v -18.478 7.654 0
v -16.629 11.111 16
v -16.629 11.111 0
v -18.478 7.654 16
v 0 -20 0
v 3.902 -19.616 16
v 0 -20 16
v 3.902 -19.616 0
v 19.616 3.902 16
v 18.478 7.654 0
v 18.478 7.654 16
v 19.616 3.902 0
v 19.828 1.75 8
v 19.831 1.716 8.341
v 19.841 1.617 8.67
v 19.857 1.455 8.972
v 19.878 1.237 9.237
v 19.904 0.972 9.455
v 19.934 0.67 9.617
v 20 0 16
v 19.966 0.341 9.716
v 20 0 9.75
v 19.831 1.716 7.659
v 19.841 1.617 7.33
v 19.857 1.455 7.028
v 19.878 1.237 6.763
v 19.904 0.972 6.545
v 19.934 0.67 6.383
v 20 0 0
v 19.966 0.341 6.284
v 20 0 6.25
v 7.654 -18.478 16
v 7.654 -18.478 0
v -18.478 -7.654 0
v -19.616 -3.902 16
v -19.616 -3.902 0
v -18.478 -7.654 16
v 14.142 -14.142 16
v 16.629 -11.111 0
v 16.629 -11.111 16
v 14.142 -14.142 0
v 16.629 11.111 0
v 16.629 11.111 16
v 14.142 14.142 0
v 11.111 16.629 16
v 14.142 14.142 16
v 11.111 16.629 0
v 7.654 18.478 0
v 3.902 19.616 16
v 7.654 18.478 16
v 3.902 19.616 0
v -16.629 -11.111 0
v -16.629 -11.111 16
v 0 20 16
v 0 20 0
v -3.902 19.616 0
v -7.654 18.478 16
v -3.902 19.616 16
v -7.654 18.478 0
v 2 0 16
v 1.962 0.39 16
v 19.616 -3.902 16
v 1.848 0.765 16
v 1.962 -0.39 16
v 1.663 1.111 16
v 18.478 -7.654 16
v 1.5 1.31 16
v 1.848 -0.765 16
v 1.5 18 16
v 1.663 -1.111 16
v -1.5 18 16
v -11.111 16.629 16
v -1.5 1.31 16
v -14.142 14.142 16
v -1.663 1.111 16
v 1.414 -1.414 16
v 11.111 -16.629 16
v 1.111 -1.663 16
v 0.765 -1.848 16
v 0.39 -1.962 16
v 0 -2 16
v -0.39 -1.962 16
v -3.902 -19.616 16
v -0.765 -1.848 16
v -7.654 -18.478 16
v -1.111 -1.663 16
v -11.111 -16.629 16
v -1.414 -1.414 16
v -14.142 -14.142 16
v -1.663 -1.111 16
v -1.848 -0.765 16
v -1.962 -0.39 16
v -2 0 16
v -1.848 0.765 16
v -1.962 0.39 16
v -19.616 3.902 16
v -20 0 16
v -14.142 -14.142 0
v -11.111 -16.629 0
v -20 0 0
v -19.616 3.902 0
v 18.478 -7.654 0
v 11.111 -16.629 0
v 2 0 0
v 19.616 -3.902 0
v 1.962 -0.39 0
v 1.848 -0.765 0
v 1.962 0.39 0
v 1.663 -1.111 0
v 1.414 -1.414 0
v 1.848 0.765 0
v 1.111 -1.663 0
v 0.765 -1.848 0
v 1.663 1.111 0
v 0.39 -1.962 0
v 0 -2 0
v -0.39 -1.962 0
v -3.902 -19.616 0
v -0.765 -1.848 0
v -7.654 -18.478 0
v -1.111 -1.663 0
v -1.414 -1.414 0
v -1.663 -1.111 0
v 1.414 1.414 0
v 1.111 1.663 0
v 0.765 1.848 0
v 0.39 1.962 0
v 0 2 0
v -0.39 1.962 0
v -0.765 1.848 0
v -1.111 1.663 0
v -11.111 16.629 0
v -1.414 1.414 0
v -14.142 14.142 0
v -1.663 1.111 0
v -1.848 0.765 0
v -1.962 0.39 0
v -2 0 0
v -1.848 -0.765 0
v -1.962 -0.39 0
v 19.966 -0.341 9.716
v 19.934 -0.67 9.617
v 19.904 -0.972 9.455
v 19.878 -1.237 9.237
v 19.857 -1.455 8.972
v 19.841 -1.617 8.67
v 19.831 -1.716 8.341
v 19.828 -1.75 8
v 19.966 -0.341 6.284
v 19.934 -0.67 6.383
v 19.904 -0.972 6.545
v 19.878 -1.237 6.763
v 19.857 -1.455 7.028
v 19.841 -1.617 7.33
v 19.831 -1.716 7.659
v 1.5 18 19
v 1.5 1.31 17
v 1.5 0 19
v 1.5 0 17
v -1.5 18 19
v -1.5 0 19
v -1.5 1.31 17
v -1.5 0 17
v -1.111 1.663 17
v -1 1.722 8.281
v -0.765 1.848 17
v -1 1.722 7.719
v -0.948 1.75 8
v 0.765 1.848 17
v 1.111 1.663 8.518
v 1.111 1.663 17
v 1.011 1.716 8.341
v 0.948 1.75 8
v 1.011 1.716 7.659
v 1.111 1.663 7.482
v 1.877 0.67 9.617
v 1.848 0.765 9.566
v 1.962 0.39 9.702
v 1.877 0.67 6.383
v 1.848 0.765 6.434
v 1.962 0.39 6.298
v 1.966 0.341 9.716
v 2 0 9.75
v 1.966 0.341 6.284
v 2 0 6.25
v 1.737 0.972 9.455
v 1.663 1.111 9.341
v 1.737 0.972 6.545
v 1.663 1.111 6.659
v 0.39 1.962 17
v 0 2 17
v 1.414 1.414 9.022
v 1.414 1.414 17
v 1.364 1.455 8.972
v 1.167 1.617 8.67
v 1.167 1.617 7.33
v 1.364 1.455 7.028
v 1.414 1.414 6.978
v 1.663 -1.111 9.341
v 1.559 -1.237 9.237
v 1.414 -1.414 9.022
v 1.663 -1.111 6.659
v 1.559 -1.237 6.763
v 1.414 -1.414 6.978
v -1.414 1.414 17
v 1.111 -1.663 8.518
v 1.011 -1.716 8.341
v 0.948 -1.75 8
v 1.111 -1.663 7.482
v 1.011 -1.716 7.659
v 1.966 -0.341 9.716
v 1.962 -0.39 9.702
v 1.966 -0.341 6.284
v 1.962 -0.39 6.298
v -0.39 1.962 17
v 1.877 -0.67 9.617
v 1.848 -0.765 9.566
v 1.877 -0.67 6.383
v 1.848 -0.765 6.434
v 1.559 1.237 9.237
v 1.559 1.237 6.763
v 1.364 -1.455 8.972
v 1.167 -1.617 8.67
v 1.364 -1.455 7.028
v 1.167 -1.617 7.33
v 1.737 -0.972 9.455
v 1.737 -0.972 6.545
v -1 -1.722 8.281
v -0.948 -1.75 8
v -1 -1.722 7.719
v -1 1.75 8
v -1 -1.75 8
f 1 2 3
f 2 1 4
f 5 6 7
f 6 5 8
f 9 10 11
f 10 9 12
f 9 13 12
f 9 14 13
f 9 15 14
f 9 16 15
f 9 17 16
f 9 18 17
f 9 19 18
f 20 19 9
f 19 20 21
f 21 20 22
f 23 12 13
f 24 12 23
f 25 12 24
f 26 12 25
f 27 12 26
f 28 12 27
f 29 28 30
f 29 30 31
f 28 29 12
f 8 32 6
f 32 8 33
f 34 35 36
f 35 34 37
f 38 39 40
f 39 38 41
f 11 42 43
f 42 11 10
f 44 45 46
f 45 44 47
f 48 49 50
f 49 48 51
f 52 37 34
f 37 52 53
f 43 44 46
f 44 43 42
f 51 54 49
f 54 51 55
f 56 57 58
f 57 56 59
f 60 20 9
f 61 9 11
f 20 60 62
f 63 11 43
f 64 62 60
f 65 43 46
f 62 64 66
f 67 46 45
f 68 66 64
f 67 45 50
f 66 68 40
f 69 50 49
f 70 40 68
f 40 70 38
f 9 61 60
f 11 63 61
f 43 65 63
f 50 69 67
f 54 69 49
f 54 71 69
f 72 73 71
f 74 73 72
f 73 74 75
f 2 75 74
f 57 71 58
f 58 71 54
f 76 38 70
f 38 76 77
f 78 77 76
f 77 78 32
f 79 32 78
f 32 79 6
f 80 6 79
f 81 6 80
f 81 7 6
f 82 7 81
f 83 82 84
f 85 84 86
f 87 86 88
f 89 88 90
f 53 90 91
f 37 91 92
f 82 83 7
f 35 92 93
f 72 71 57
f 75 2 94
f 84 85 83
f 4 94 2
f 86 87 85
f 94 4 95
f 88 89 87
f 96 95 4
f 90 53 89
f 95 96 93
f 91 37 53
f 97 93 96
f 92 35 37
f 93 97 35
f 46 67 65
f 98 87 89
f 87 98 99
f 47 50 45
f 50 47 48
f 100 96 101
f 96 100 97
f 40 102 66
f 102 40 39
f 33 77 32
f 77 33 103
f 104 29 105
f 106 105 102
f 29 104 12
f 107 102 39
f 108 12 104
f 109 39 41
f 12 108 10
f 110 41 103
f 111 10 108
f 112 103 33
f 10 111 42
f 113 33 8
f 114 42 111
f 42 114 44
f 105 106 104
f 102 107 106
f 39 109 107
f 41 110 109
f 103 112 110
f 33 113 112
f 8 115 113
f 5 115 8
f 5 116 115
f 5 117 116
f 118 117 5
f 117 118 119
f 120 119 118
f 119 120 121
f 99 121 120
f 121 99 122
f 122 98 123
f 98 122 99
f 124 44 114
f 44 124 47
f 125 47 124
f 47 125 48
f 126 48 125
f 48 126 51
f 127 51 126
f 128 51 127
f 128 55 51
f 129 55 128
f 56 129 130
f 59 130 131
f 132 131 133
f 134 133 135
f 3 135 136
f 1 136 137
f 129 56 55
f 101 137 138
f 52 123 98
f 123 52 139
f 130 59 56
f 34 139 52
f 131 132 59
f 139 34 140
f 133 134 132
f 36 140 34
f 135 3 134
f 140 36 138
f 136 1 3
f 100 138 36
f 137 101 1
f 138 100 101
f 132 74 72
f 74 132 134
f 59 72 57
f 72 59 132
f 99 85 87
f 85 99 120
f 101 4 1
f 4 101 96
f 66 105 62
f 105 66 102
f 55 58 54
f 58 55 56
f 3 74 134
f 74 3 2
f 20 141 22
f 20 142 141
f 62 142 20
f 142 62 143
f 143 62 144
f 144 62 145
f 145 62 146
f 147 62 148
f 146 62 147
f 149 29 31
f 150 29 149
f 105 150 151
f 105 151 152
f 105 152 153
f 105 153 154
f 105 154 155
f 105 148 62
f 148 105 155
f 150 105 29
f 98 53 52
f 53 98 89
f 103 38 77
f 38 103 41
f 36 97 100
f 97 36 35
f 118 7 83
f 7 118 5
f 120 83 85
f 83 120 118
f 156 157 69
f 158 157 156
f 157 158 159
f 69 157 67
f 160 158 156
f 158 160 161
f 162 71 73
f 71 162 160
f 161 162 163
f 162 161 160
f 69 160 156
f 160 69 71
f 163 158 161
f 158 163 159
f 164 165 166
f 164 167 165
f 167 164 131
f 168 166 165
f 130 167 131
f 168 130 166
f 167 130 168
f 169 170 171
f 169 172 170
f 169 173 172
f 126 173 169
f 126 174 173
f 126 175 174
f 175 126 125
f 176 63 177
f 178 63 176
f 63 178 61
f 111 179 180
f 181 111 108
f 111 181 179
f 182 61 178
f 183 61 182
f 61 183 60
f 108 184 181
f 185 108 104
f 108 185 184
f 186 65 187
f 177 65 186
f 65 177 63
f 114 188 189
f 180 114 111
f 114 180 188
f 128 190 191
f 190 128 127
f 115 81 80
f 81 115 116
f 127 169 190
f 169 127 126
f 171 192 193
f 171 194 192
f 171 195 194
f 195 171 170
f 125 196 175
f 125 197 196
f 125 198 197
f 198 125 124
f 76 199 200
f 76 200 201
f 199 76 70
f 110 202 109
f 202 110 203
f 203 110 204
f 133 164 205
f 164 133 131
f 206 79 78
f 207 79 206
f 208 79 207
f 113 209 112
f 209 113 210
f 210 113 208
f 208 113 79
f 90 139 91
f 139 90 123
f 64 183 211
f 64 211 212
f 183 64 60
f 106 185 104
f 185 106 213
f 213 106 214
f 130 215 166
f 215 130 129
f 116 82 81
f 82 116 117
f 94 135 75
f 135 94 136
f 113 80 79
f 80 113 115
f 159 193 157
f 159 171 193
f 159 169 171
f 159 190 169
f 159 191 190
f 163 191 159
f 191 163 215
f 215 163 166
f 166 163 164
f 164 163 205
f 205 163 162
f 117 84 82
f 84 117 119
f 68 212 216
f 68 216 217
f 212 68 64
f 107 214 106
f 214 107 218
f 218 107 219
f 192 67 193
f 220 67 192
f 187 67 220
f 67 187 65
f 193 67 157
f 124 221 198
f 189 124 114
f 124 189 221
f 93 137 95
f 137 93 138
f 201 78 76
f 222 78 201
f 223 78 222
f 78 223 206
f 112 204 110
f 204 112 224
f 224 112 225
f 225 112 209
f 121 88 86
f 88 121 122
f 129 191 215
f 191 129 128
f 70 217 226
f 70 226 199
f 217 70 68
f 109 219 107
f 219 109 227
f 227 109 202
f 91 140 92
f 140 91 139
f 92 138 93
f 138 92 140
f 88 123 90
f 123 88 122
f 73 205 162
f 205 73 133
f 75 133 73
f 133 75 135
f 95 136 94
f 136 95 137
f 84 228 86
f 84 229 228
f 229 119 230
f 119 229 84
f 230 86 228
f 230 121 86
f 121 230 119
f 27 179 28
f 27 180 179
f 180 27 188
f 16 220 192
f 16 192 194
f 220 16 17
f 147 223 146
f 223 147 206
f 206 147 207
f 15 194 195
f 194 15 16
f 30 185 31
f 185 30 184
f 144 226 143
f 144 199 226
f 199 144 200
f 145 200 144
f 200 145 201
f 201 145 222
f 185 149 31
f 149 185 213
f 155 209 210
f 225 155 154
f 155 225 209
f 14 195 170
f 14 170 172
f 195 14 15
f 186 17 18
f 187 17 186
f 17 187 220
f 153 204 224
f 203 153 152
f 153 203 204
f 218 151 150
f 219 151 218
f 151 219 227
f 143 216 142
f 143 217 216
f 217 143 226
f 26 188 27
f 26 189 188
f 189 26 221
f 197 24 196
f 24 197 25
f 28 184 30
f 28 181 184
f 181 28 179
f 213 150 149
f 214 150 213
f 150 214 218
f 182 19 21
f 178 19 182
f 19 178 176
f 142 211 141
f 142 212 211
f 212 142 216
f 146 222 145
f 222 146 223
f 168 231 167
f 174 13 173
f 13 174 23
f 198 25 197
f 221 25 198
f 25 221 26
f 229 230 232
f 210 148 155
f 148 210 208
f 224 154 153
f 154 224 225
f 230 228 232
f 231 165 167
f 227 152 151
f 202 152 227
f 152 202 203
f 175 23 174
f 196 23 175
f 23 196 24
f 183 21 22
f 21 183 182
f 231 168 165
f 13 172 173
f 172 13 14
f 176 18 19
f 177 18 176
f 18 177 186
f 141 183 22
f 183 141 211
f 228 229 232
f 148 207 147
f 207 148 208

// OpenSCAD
$fn = 32;

// ----------------------------------------------------------------------
// Control knob: pointer knob
// ----------------------------------------------------------------------

// --- parameters (mm) ---
rib_w = 3;                // pointer rib width
rib_h = 4;                // pointer rib height
knob_d = 40;              // knob body diameter
knob_h = 16;              // knob body height
bore_d = 4;               // shaft bore diameter
set_d = 3.5;              // set screw bore diameter
fit_tol = 0.02;           // tolerance for press fits, mm
free_tol = 0.2;           // tolerance for clearance fits, mm

rib_poke = rib_h - 1;  // rib height above the top
total_h = knob_h + rib_h - 1;  // overall height

difference() {
  union() {
    cylinder(h = knob_h, d = knob_d);
    translate([-rib_w / 2, 0, knob_h - 1])
      cube([rib_w, knob_d / 2 - 2, rib_h]);
  }
  translate([0, 0, -1]) cylinder(h = knob_h + 2, d = bore_d);
  translate([-1, 0, knob_h / 2]) rotate([0, 90, 0])
    cylinder(h = knob_d / 2 + bore_d / 2 + 2, d = set_d);}
